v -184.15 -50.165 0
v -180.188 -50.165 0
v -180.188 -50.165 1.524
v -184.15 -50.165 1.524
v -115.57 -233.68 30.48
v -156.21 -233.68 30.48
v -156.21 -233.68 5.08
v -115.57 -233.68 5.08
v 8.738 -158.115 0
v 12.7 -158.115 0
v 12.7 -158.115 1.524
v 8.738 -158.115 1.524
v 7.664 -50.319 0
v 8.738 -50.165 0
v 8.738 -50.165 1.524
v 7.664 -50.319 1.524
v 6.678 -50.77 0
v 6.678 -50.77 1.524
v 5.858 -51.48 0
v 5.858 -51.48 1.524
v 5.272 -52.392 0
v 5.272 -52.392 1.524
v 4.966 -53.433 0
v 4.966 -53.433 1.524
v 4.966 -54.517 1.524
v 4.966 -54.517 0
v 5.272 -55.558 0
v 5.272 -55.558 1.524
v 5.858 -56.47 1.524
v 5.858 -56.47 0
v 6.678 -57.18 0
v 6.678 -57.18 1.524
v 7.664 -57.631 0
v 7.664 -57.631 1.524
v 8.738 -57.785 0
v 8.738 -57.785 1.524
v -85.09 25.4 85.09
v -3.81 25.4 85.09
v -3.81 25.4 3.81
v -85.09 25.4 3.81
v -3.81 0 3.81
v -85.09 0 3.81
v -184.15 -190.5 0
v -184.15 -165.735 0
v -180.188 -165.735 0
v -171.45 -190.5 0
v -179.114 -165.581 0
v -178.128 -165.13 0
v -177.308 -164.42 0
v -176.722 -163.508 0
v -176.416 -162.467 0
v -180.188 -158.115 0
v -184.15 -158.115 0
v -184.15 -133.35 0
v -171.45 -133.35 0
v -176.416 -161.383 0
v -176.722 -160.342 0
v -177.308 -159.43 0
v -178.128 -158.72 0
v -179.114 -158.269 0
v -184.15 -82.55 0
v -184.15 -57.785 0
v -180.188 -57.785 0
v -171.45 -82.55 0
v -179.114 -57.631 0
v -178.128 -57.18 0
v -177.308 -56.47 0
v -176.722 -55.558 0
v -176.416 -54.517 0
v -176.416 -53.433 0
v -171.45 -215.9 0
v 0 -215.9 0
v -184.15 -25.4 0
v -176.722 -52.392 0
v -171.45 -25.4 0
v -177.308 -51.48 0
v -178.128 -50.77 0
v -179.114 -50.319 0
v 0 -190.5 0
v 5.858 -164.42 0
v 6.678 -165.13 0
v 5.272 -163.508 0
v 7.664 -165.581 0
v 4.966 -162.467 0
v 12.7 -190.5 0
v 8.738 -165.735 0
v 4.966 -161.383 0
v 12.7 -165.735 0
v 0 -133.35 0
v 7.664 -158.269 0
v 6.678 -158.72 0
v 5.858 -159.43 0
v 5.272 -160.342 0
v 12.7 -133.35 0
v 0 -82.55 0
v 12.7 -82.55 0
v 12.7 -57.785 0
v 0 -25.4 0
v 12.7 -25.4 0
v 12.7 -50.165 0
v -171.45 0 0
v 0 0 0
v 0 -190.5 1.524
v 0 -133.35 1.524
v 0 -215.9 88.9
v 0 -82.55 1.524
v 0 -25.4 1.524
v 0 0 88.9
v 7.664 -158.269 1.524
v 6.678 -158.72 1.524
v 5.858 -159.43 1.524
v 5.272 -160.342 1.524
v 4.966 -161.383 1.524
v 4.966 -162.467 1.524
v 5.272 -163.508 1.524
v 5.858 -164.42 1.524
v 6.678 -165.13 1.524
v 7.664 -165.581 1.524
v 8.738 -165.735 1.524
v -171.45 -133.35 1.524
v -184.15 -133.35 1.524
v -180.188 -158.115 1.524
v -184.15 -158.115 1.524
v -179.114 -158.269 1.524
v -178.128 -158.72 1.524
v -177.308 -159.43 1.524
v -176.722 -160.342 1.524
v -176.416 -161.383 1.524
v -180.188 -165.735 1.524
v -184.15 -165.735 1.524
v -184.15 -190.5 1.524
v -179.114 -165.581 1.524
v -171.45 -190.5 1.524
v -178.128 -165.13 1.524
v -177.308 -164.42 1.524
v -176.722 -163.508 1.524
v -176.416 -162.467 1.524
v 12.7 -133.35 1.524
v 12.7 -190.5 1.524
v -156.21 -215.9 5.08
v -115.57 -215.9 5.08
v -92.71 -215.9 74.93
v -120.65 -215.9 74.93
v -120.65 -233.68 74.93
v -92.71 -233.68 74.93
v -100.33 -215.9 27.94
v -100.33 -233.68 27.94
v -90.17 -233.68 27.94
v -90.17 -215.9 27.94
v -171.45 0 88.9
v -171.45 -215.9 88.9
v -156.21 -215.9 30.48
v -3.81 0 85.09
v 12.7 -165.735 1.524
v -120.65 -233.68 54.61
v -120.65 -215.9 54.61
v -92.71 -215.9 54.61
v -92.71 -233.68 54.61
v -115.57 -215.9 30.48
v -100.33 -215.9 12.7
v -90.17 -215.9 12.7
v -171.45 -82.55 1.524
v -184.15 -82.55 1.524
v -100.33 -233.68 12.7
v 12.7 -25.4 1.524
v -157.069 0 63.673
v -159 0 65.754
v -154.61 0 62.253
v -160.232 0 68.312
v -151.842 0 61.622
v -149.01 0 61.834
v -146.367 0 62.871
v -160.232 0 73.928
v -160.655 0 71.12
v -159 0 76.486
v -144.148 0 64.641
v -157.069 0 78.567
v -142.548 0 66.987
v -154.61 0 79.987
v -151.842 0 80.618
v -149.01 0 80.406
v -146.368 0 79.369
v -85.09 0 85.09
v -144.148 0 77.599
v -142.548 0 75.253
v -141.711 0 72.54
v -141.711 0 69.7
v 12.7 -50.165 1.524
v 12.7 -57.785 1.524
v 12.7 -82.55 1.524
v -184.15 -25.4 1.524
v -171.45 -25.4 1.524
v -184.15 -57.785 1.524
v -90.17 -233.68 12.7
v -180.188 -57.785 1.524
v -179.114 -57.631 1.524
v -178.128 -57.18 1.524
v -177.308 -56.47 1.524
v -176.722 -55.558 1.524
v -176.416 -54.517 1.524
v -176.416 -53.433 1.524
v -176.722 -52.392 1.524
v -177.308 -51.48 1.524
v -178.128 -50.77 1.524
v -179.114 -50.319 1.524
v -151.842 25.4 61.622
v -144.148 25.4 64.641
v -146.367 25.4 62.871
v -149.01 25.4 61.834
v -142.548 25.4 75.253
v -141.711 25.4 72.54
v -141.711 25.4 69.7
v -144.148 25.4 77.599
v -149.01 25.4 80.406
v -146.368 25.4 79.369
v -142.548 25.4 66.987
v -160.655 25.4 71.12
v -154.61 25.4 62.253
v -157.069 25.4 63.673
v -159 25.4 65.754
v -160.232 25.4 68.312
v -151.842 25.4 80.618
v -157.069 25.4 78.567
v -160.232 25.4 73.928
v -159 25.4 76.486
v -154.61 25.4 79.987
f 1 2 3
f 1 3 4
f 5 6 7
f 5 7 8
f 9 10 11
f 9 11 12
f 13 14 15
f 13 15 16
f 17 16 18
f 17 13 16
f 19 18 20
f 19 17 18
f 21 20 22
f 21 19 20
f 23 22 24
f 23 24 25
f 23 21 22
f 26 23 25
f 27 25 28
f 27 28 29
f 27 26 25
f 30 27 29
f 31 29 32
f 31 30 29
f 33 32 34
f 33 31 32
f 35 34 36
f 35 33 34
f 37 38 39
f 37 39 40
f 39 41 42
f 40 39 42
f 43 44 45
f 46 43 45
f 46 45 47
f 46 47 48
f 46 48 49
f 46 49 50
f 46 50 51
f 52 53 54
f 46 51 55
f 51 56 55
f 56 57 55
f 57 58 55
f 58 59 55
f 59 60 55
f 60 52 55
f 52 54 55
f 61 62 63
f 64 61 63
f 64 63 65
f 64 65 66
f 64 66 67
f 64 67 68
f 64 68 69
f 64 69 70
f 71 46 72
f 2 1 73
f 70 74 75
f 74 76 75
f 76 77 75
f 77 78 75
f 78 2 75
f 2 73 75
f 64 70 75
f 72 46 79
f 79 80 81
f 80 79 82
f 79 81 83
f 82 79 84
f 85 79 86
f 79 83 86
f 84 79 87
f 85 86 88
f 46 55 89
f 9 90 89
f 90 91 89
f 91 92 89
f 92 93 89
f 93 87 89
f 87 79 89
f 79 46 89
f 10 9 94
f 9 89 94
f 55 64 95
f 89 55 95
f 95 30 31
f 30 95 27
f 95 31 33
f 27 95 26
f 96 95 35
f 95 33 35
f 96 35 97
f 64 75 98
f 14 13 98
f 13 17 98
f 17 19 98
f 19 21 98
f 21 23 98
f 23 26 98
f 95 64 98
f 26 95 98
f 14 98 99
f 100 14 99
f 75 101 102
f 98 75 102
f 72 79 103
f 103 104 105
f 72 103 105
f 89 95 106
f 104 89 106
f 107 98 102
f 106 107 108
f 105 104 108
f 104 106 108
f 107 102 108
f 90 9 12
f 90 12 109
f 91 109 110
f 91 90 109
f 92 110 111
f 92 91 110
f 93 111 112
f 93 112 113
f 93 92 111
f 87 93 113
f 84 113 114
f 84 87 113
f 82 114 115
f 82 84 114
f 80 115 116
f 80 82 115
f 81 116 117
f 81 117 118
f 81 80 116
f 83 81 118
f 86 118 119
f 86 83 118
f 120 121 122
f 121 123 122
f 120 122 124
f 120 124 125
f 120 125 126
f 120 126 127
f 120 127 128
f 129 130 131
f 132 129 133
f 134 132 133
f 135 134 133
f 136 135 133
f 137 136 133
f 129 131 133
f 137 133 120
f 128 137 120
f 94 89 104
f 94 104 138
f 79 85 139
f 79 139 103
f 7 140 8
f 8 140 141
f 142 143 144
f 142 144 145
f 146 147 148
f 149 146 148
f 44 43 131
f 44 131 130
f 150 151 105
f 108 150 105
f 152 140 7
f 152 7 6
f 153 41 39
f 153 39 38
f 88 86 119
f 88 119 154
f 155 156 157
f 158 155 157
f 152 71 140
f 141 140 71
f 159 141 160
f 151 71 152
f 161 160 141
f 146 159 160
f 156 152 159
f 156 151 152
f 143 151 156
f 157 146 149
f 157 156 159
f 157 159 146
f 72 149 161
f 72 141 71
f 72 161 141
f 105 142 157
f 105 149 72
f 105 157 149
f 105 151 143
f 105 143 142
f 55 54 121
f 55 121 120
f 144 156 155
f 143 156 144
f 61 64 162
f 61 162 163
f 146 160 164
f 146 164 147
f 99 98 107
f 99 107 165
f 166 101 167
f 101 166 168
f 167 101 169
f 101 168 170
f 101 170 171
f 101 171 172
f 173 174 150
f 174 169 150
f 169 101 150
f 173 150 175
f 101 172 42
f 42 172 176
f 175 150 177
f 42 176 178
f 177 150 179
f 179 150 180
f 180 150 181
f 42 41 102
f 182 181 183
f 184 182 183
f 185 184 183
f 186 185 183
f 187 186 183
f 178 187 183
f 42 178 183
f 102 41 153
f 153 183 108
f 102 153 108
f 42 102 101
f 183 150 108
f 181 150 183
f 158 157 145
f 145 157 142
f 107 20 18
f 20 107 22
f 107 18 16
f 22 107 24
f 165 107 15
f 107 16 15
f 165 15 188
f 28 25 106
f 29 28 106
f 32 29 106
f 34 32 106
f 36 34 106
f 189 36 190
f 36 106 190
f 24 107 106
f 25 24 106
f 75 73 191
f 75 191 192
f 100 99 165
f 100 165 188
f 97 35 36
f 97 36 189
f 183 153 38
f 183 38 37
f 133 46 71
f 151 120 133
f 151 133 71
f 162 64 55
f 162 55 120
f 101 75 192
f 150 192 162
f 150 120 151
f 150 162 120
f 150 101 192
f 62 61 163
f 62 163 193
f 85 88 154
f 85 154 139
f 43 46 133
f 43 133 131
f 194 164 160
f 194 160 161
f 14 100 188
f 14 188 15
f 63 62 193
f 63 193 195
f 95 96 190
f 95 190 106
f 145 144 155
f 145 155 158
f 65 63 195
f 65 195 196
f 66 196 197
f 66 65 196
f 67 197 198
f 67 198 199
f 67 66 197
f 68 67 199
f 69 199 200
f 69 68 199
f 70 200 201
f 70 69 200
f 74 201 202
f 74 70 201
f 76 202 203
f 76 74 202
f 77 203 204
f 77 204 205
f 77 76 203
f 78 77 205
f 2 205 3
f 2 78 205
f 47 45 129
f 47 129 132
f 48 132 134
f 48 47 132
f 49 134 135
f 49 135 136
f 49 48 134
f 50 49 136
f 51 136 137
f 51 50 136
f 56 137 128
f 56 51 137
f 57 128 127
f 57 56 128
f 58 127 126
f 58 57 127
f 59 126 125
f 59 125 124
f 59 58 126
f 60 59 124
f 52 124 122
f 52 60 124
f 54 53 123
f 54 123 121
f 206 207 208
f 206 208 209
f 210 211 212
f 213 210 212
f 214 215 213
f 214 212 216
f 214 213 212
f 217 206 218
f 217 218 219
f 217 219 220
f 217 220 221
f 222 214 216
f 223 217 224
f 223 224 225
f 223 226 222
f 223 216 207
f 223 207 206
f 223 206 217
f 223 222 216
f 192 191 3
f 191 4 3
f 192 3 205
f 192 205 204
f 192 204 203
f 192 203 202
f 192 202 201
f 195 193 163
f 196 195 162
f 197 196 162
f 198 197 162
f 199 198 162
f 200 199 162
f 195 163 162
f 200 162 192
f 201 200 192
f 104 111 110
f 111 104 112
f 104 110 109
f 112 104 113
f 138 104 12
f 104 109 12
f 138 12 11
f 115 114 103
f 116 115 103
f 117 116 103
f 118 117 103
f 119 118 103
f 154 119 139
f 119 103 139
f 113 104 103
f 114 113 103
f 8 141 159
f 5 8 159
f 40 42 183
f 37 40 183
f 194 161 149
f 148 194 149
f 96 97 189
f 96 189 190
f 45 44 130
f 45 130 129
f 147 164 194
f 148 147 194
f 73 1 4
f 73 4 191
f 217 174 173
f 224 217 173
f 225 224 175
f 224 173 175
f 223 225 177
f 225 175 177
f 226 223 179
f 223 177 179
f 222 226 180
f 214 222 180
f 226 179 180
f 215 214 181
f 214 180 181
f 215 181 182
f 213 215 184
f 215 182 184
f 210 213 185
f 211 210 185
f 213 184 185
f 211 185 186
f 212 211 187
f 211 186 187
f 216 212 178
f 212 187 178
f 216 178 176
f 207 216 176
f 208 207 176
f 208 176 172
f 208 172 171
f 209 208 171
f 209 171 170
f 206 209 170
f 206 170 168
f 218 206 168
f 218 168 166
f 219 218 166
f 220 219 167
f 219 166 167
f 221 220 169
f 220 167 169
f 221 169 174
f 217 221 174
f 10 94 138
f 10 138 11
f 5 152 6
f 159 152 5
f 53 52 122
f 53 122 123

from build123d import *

# Parameters (mm, degrees)
F0_W     = 171.45
F0_H     = 88.9
F1_DEPTH = 215.9
F2_W     = 40.64
F2_H     = 25.4
F2_W_2   = 27.94
F2_H_2   = 20.32
F2_W_3   = 10.16
F2_H_3   = 15.24
F3_DEPTH = 17.78
F4_W     = 81.28
F4_H     = 81.28
F4_R     = 9.525
F5_DEPTH = 25.4
F7_DEPTH = 1.524


with BuildPart() as f1:
    # F0 (on Front) → F1 (new body)
    with BuildSketch(Plane.XZ):
        with Locations((-85.725, 44.45)):
            Rectangle(F0_W, F0_H)
    extrude(amount=F1_DEPTH)

    # F2 (on face) → F3 (join)
    with BuildSketch(Plane.XZ.offset(215.9)):
        with Locations((-135.89, 17.78)):
            Rectangle(F2_W, F2_H)
        with Locations((-106.68, 64.77)):
            Rectangle(F2_W_2, F2_H_2)
        with Locations((-95.25, 20.32)):
            Rectangle(F2_W_3, F2_H_3)
    extrude(amount=F3_DEPTH)

    # F4 (on face) → F5 (join)
    with BuildSketch(Plane(origin=(0, 0, 0), x_dir=(-1, 0, 0), z_dir=(0, 1, 0))):
        with Locations((44.45, 44.45)):
            Rectangle(F4_W, F4_H)
        with Locations((151.13, 71.12)):
            Circle(F4_R)
    extrude(amount=F5_DEPTH)

    # F6 (on face) → F7 (join)
    with BuildSketch(Plane(origin=(0, 0, 0), x_dir=(1, 0, 0), z_dir=(0, 0, -1))):
        with BuildLine():
            Line((-184.15, 25.4), (-171.45, 25.4))
            Line((-171.45, 25.4), (-171.45, 82.55))
            Line((-171.45, 82.55), (-184.15, 82.55))
            Line((-184.15, 82.55), (-184.15, 57.785))
            Line((-184.15, 57.785), (-180.1876, 57.785))
            ThreePointArc((-180.1876, 57.785), (-176.3776, 53.975), (-180.1876, 50.165))
            Line((-180.1876, 50.165), (-184.15, 50.165))
            Line((-184.15, 50.165), (-184.15, 25.4))
        make_face()
        with BuildLine():
            Line((-184.15, 133.35), (-171.45, 133.35))
            Line((-171.45, 133.35), (-171.45, 190.5))
            Line((-171.45, 190.5), (-184.15, 190.5))
            Line((-184.15, 190.5), (-184.15, 165.735))
            Line((-184.15, 165.735), (-180.1876, 165.735))
            ThreePointArc((-180.1876, 165.735), (-176.3776, 161.925), (-180.1876, 158.115))
            Line((-180.1876, 158.115), (-184.15, 158.115))
            Line((-184.15, 158.115), (-184.15, 133.35))
        make_face()
        with BuildLine():
            Line((0, 190.5), (0, 133.35))
            Line((0, 133.35), (12.7, 133.35))
            Line((12.7, 133.35), (12.7, 158.115))
            Line((12.7, 158.115), (8.7376, 158.115))
            ThreePointArc((8.7376, 158.115), (4.9276, 161.925), (8.7376, 165.735))
            Line((8.7376, 165.735), (12.7, 165.735))
            Line((12.7, 165.735), (12.7, 190.5))
            Line((12.7, 190.5), (0, 190.5))
        make_face()
        with BuildLine():
            Line((0, 82.55), (0, 25.4))
            Line((0, 25.4), (12.7, 25.4))
            Line((12.7, 25.4), (12.7, 50.165))
            Line((12.7, 50.165), (8.7376, 50.165))
            ThreePointArc((8.7376, 50.165), (4.9276, 53.975), (8.7376, 57.785))
            Line((8.7376, 57.785), (12.7, 57.785))
            Line((12.7, 57.785), (12.7, 82.55))
            Line((12.7, 82.55), (0, 82.55))
        make_face()
    extrude(amount=-F7_DEPTH)


solid = f1.part
